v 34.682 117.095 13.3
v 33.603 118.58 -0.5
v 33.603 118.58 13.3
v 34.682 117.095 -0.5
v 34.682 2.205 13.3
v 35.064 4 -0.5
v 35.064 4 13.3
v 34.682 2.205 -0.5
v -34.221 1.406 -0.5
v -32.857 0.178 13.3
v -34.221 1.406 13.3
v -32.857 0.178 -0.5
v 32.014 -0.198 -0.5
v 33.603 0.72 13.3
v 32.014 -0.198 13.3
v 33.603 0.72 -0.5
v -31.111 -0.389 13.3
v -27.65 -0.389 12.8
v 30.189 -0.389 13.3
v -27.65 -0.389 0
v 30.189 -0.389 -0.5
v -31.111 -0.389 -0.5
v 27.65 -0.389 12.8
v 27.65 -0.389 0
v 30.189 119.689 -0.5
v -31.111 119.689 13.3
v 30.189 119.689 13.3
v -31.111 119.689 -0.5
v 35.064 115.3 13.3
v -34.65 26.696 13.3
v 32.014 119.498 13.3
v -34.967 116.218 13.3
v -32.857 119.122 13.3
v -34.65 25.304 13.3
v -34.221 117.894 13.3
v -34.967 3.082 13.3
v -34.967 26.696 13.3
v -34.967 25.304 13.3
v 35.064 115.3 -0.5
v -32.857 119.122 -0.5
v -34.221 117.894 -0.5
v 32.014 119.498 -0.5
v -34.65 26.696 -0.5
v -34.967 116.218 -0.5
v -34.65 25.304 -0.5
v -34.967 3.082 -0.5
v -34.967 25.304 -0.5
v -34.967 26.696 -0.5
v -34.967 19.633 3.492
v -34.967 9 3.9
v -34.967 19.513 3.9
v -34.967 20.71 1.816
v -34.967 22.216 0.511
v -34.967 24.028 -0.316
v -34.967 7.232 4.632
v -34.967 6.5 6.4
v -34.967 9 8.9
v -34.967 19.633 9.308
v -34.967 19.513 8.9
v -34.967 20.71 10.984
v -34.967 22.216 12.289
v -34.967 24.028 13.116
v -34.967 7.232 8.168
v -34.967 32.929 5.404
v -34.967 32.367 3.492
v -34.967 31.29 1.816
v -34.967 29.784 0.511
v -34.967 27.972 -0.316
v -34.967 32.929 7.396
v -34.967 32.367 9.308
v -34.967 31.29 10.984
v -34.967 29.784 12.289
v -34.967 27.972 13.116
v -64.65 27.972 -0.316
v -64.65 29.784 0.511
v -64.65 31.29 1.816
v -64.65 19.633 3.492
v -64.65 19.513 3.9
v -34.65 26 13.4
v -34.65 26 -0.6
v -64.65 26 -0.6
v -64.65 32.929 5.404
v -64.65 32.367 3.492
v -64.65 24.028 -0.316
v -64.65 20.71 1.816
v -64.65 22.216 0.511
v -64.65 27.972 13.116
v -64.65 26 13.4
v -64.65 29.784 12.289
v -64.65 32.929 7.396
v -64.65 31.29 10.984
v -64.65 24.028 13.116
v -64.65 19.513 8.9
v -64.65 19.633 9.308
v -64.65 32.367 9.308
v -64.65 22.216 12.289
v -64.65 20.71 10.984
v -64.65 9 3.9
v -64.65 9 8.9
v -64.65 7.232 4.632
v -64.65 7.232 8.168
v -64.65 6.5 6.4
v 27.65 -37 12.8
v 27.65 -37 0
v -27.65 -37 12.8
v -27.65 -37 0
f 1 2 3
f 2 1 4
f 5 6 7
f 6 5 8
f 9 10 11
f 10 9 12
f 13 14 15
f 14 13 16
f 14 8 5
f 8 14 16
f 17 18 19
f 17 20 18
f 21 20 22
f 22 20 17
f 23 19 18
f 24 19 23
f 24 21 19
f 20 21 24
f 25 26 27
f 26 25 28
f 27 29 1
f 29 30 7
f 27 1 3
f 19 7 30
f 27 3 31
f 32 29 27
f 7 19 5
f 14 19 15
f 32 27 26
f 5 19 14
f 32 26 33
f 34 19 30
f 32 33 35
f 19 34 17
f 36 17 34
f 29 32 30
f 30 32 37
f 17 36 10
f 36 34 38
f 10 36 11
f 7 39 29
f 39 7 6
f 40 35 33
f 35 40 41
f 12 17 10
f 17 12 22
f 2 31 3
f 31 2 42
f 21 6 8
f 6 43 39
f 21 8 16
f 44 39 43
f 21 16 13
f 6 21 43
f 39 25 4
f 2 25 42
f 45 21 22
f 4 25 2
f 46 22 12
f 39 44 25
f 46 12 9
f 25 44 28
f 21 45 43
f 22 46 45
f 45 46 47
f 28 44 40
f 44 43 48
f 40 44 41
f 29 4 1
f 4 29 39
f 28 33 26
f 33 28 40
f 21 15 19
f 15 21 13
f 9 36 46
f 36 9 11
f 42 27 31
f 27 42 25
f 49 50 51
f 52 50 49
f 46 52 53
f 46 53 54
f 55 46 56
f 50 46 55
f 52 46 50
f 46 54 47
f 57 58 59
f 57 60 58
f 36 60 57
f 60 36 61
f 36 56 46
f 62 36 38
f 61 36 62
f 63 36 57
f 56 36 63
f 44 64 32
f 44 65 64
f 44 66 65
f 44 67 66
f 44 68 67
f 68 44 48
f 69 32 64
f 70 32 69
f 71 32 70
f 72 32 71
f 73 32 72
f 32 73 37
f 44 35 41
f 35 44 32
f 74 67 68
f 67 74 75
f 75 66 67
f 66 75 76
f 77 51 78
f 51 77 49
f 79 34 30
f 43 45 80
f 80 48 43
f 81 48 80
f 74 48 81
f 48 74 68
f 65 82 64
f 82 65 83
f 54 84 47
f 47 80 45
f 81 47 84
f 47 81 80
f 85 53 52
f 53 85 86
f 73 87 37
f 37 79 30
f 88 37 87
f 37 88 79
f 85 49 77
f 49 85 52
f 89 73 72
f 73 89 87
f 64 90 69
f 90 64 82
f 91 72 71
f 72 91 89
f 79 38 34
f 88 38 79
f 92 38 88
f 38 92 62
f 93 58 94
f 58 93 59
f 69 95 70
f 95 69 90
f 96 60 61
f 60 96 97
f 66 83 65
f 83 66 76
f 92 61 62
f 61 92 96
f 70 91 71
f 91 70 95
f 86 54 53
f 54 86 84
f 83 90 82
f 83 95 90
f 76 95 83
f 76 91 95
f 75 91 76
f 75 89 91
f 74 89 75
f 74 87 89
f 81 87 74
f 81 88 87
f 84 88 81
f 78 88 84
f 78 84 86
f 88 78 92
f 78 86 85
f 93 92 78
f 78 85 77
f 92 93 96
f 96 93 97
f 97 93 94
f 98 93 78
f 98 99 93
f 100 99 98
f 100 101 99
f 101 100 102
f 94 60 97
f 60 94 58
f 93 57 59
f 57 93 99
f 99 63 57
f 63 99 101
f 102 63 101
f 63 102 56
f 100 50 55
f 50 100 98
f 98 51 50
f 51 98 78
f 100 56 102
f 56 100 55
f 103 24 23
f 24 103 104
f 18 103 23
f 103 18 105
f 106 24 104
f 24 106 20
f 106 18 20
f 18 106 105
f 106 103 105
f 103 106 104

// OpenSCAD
// file: roundedCube.scad
// Example:
roundedCube(
  x = 30,
  y = 20,
  z = 10,
  r = 3,
  flatBottom = true
);

module roundedCube(
  x,
  y,
  z,
  r = 0,
  flatTop = false,
  flatBottom = false,
  flatLeft = false,
  flatRight = false,
  flatFront = false,
  flatBack = false
) {

  // Calculate [ x, y, z ] compensations based on requested roundings:
  rX = r * (flatLeft && flatRight ? 0 : (flatLeft || flatRight ? 1 : 2));
  rY = r * (flatFront && flatBack ? 0 : (flatFront || flatBack ? 1 : 2));
  rZ = r * (flatTop && flatBottom ? 0 : (flatTop || flatBottom ? 1 : 2));

  // Do some sanity checks:
  if (x - rX <= 0) {
    echo("<b style='color: red'>WARNING</b>: roundedCube() is too small along its x-axis");
  }
  if (y - rY <= 0) {
    echo("<b style='color: red'>WARNING</b>: roundedCube() is too small along its y-axis");
  }
  if (z - rZ <= 0) {
    echo("<b style='color: red'>WARNING</b>: roundedCube() is too small along its z-axis");
  }

  difference() {

    // Main rounded cube:
    translate([
      flatLeft ? 0 : r,
      flatFront ? 0 : r,
      flatBottom ? 0 : r
    ]) {
      minkowski() {
        cube([
          x - rX,
          y - rY,
          z - rZ
        ]);
        sphere(r = r);
      }
    }

    // Optional cutouts:
    // (let's not generate unnecessary geometry)
    if (flatTop) {
      translate([ x / -2, y / -2, z ])
      cube([ x * 2, y * 2, z ]);
    }
    if (flatBottom) {
      translate([ x / -2, y / -2, -z ])
      cube([ x * 2, y * 2, z ]);
    }
    if (flatLeft) {
      translate([ -x, y / -2, z / -2 ])
      cube([ x, y * 2, z * 2 ]);
    }
    if (flatRight) {
      translate([ x, y / -2, z / -2 ])
      cube([ x, y * 2, z * 2 ]);
    }
    if (flatFront) {
      translate([ x / -2, -y, z / -2 ])
      cube([ x * 2, y, z * 2 ]);
    }
    if (flatBack) {
      translate([ x / -2, y, z / -2 ])
      cube([ x * 2, y, z * 2 ]);
    }

  }

}
// file: config.scad
GLOBAL_ROUNDING = 5;

DEXCOM_WIDTH = 46.4;
DEXCOM_HEIGHT = 99.3;
DEXCOM_DEPTH = 13.0;
DEXCOM_ROUNDING = 3.5;

SAMSUNG_WIDTH = 69.8;
SAMSUNG_HEIGHT = 136.5;
SAMSUNG_DEPTH = 8.3;
SAMSUNG_CAM_BUMP_HEIGHT = 1.5; // actually measured: 0.7
SAMSUNG_BUTTONS_HEIGHT = 1; // actually measured: 0.5
SAMSUNG_ROUNDING = 4.5; // approximation was 7, but matching Mophie

MOPHIE_WIDTH = 69.3;
MOPHIE_HEIGHT = 119.3;
MOPHIE_DEPTH = 12.8;
MOPHIE_ROUNDING = 4.5; // approximation

RIG_WIDTH = 75;
RIG_WALL_THICKNESS = 3.5;
// main file
include <config.scad>;

use <roundedCube.scad>;

// Example:
mophie(0.5);

module mophie(
  withTolerance = 0,
  extendUpBy = 0
) {

  // Main body:
  minkowski() {
    translate([ MOPHIE_WIDTH / -2, 0, 0 ])
    roundedCube(
      MOPHIE_WIDTH,
      MOPHIE_HEIGHT,
      MOPHIE_DEPTH + extendUpBy,
      r = MOPHIE_ROUNDING,
      flatTop = true,
      flatBottom = true
    );
    translate([ -withTolerance, -withTolerance, -withTolerance ])
    cube([ withTolerance * 2, withTolerance * 2, withTolerance * 2 ]);
  }

  // Button/lights access:
  buttonsSpace = 30;
  openingDiameter = 14;
  openingSmallerDiameter = 5;
  openingUpTo = 26;
  openingUpFrom = 9;
  translate([ MOPHIE_WIDTH / -2 - buttonsSpace, openingUpTo, MOPHIE_DEPTH / 2 ])
  rotate([ 0, 90, 0 ])
  cylinder(r = openingDiameter / 2, h = buttonsSpace);
  hull() {
    translate([ MOPHIE_WIDTH / -2 - buttonsSpace, openingUpTo, MOPHIE_DEPTH / 2 ])
    rotate([ 0, 90, 0 ])
    cylinder(r = openingSmallerDiameter / 2, h = buttonsSpace);
    translate([ MOPHIE_WIDTH / -2 - buttonsSpace, openingUpFrom, MOPHIE_DEPTH / 2 ])
    rotate([ 0, 90, 0 ])
    cylinder(r = openingSmallerDiameter / 2, h = buttonsSpace);
  }

  // Bottom access:
  bottomMargin = 7;
  bottomSpace = 37;
  translate([ MOPHIE_WIDTH / -2 + bottomMargin, -bottomSpace, 0 ])
  cube([
    MOPHIE_WIDTH - bottomMargin * 2,
    bottomSpace,
    MOPHIE_DEPTH + extendUpBy
  ]);

}
